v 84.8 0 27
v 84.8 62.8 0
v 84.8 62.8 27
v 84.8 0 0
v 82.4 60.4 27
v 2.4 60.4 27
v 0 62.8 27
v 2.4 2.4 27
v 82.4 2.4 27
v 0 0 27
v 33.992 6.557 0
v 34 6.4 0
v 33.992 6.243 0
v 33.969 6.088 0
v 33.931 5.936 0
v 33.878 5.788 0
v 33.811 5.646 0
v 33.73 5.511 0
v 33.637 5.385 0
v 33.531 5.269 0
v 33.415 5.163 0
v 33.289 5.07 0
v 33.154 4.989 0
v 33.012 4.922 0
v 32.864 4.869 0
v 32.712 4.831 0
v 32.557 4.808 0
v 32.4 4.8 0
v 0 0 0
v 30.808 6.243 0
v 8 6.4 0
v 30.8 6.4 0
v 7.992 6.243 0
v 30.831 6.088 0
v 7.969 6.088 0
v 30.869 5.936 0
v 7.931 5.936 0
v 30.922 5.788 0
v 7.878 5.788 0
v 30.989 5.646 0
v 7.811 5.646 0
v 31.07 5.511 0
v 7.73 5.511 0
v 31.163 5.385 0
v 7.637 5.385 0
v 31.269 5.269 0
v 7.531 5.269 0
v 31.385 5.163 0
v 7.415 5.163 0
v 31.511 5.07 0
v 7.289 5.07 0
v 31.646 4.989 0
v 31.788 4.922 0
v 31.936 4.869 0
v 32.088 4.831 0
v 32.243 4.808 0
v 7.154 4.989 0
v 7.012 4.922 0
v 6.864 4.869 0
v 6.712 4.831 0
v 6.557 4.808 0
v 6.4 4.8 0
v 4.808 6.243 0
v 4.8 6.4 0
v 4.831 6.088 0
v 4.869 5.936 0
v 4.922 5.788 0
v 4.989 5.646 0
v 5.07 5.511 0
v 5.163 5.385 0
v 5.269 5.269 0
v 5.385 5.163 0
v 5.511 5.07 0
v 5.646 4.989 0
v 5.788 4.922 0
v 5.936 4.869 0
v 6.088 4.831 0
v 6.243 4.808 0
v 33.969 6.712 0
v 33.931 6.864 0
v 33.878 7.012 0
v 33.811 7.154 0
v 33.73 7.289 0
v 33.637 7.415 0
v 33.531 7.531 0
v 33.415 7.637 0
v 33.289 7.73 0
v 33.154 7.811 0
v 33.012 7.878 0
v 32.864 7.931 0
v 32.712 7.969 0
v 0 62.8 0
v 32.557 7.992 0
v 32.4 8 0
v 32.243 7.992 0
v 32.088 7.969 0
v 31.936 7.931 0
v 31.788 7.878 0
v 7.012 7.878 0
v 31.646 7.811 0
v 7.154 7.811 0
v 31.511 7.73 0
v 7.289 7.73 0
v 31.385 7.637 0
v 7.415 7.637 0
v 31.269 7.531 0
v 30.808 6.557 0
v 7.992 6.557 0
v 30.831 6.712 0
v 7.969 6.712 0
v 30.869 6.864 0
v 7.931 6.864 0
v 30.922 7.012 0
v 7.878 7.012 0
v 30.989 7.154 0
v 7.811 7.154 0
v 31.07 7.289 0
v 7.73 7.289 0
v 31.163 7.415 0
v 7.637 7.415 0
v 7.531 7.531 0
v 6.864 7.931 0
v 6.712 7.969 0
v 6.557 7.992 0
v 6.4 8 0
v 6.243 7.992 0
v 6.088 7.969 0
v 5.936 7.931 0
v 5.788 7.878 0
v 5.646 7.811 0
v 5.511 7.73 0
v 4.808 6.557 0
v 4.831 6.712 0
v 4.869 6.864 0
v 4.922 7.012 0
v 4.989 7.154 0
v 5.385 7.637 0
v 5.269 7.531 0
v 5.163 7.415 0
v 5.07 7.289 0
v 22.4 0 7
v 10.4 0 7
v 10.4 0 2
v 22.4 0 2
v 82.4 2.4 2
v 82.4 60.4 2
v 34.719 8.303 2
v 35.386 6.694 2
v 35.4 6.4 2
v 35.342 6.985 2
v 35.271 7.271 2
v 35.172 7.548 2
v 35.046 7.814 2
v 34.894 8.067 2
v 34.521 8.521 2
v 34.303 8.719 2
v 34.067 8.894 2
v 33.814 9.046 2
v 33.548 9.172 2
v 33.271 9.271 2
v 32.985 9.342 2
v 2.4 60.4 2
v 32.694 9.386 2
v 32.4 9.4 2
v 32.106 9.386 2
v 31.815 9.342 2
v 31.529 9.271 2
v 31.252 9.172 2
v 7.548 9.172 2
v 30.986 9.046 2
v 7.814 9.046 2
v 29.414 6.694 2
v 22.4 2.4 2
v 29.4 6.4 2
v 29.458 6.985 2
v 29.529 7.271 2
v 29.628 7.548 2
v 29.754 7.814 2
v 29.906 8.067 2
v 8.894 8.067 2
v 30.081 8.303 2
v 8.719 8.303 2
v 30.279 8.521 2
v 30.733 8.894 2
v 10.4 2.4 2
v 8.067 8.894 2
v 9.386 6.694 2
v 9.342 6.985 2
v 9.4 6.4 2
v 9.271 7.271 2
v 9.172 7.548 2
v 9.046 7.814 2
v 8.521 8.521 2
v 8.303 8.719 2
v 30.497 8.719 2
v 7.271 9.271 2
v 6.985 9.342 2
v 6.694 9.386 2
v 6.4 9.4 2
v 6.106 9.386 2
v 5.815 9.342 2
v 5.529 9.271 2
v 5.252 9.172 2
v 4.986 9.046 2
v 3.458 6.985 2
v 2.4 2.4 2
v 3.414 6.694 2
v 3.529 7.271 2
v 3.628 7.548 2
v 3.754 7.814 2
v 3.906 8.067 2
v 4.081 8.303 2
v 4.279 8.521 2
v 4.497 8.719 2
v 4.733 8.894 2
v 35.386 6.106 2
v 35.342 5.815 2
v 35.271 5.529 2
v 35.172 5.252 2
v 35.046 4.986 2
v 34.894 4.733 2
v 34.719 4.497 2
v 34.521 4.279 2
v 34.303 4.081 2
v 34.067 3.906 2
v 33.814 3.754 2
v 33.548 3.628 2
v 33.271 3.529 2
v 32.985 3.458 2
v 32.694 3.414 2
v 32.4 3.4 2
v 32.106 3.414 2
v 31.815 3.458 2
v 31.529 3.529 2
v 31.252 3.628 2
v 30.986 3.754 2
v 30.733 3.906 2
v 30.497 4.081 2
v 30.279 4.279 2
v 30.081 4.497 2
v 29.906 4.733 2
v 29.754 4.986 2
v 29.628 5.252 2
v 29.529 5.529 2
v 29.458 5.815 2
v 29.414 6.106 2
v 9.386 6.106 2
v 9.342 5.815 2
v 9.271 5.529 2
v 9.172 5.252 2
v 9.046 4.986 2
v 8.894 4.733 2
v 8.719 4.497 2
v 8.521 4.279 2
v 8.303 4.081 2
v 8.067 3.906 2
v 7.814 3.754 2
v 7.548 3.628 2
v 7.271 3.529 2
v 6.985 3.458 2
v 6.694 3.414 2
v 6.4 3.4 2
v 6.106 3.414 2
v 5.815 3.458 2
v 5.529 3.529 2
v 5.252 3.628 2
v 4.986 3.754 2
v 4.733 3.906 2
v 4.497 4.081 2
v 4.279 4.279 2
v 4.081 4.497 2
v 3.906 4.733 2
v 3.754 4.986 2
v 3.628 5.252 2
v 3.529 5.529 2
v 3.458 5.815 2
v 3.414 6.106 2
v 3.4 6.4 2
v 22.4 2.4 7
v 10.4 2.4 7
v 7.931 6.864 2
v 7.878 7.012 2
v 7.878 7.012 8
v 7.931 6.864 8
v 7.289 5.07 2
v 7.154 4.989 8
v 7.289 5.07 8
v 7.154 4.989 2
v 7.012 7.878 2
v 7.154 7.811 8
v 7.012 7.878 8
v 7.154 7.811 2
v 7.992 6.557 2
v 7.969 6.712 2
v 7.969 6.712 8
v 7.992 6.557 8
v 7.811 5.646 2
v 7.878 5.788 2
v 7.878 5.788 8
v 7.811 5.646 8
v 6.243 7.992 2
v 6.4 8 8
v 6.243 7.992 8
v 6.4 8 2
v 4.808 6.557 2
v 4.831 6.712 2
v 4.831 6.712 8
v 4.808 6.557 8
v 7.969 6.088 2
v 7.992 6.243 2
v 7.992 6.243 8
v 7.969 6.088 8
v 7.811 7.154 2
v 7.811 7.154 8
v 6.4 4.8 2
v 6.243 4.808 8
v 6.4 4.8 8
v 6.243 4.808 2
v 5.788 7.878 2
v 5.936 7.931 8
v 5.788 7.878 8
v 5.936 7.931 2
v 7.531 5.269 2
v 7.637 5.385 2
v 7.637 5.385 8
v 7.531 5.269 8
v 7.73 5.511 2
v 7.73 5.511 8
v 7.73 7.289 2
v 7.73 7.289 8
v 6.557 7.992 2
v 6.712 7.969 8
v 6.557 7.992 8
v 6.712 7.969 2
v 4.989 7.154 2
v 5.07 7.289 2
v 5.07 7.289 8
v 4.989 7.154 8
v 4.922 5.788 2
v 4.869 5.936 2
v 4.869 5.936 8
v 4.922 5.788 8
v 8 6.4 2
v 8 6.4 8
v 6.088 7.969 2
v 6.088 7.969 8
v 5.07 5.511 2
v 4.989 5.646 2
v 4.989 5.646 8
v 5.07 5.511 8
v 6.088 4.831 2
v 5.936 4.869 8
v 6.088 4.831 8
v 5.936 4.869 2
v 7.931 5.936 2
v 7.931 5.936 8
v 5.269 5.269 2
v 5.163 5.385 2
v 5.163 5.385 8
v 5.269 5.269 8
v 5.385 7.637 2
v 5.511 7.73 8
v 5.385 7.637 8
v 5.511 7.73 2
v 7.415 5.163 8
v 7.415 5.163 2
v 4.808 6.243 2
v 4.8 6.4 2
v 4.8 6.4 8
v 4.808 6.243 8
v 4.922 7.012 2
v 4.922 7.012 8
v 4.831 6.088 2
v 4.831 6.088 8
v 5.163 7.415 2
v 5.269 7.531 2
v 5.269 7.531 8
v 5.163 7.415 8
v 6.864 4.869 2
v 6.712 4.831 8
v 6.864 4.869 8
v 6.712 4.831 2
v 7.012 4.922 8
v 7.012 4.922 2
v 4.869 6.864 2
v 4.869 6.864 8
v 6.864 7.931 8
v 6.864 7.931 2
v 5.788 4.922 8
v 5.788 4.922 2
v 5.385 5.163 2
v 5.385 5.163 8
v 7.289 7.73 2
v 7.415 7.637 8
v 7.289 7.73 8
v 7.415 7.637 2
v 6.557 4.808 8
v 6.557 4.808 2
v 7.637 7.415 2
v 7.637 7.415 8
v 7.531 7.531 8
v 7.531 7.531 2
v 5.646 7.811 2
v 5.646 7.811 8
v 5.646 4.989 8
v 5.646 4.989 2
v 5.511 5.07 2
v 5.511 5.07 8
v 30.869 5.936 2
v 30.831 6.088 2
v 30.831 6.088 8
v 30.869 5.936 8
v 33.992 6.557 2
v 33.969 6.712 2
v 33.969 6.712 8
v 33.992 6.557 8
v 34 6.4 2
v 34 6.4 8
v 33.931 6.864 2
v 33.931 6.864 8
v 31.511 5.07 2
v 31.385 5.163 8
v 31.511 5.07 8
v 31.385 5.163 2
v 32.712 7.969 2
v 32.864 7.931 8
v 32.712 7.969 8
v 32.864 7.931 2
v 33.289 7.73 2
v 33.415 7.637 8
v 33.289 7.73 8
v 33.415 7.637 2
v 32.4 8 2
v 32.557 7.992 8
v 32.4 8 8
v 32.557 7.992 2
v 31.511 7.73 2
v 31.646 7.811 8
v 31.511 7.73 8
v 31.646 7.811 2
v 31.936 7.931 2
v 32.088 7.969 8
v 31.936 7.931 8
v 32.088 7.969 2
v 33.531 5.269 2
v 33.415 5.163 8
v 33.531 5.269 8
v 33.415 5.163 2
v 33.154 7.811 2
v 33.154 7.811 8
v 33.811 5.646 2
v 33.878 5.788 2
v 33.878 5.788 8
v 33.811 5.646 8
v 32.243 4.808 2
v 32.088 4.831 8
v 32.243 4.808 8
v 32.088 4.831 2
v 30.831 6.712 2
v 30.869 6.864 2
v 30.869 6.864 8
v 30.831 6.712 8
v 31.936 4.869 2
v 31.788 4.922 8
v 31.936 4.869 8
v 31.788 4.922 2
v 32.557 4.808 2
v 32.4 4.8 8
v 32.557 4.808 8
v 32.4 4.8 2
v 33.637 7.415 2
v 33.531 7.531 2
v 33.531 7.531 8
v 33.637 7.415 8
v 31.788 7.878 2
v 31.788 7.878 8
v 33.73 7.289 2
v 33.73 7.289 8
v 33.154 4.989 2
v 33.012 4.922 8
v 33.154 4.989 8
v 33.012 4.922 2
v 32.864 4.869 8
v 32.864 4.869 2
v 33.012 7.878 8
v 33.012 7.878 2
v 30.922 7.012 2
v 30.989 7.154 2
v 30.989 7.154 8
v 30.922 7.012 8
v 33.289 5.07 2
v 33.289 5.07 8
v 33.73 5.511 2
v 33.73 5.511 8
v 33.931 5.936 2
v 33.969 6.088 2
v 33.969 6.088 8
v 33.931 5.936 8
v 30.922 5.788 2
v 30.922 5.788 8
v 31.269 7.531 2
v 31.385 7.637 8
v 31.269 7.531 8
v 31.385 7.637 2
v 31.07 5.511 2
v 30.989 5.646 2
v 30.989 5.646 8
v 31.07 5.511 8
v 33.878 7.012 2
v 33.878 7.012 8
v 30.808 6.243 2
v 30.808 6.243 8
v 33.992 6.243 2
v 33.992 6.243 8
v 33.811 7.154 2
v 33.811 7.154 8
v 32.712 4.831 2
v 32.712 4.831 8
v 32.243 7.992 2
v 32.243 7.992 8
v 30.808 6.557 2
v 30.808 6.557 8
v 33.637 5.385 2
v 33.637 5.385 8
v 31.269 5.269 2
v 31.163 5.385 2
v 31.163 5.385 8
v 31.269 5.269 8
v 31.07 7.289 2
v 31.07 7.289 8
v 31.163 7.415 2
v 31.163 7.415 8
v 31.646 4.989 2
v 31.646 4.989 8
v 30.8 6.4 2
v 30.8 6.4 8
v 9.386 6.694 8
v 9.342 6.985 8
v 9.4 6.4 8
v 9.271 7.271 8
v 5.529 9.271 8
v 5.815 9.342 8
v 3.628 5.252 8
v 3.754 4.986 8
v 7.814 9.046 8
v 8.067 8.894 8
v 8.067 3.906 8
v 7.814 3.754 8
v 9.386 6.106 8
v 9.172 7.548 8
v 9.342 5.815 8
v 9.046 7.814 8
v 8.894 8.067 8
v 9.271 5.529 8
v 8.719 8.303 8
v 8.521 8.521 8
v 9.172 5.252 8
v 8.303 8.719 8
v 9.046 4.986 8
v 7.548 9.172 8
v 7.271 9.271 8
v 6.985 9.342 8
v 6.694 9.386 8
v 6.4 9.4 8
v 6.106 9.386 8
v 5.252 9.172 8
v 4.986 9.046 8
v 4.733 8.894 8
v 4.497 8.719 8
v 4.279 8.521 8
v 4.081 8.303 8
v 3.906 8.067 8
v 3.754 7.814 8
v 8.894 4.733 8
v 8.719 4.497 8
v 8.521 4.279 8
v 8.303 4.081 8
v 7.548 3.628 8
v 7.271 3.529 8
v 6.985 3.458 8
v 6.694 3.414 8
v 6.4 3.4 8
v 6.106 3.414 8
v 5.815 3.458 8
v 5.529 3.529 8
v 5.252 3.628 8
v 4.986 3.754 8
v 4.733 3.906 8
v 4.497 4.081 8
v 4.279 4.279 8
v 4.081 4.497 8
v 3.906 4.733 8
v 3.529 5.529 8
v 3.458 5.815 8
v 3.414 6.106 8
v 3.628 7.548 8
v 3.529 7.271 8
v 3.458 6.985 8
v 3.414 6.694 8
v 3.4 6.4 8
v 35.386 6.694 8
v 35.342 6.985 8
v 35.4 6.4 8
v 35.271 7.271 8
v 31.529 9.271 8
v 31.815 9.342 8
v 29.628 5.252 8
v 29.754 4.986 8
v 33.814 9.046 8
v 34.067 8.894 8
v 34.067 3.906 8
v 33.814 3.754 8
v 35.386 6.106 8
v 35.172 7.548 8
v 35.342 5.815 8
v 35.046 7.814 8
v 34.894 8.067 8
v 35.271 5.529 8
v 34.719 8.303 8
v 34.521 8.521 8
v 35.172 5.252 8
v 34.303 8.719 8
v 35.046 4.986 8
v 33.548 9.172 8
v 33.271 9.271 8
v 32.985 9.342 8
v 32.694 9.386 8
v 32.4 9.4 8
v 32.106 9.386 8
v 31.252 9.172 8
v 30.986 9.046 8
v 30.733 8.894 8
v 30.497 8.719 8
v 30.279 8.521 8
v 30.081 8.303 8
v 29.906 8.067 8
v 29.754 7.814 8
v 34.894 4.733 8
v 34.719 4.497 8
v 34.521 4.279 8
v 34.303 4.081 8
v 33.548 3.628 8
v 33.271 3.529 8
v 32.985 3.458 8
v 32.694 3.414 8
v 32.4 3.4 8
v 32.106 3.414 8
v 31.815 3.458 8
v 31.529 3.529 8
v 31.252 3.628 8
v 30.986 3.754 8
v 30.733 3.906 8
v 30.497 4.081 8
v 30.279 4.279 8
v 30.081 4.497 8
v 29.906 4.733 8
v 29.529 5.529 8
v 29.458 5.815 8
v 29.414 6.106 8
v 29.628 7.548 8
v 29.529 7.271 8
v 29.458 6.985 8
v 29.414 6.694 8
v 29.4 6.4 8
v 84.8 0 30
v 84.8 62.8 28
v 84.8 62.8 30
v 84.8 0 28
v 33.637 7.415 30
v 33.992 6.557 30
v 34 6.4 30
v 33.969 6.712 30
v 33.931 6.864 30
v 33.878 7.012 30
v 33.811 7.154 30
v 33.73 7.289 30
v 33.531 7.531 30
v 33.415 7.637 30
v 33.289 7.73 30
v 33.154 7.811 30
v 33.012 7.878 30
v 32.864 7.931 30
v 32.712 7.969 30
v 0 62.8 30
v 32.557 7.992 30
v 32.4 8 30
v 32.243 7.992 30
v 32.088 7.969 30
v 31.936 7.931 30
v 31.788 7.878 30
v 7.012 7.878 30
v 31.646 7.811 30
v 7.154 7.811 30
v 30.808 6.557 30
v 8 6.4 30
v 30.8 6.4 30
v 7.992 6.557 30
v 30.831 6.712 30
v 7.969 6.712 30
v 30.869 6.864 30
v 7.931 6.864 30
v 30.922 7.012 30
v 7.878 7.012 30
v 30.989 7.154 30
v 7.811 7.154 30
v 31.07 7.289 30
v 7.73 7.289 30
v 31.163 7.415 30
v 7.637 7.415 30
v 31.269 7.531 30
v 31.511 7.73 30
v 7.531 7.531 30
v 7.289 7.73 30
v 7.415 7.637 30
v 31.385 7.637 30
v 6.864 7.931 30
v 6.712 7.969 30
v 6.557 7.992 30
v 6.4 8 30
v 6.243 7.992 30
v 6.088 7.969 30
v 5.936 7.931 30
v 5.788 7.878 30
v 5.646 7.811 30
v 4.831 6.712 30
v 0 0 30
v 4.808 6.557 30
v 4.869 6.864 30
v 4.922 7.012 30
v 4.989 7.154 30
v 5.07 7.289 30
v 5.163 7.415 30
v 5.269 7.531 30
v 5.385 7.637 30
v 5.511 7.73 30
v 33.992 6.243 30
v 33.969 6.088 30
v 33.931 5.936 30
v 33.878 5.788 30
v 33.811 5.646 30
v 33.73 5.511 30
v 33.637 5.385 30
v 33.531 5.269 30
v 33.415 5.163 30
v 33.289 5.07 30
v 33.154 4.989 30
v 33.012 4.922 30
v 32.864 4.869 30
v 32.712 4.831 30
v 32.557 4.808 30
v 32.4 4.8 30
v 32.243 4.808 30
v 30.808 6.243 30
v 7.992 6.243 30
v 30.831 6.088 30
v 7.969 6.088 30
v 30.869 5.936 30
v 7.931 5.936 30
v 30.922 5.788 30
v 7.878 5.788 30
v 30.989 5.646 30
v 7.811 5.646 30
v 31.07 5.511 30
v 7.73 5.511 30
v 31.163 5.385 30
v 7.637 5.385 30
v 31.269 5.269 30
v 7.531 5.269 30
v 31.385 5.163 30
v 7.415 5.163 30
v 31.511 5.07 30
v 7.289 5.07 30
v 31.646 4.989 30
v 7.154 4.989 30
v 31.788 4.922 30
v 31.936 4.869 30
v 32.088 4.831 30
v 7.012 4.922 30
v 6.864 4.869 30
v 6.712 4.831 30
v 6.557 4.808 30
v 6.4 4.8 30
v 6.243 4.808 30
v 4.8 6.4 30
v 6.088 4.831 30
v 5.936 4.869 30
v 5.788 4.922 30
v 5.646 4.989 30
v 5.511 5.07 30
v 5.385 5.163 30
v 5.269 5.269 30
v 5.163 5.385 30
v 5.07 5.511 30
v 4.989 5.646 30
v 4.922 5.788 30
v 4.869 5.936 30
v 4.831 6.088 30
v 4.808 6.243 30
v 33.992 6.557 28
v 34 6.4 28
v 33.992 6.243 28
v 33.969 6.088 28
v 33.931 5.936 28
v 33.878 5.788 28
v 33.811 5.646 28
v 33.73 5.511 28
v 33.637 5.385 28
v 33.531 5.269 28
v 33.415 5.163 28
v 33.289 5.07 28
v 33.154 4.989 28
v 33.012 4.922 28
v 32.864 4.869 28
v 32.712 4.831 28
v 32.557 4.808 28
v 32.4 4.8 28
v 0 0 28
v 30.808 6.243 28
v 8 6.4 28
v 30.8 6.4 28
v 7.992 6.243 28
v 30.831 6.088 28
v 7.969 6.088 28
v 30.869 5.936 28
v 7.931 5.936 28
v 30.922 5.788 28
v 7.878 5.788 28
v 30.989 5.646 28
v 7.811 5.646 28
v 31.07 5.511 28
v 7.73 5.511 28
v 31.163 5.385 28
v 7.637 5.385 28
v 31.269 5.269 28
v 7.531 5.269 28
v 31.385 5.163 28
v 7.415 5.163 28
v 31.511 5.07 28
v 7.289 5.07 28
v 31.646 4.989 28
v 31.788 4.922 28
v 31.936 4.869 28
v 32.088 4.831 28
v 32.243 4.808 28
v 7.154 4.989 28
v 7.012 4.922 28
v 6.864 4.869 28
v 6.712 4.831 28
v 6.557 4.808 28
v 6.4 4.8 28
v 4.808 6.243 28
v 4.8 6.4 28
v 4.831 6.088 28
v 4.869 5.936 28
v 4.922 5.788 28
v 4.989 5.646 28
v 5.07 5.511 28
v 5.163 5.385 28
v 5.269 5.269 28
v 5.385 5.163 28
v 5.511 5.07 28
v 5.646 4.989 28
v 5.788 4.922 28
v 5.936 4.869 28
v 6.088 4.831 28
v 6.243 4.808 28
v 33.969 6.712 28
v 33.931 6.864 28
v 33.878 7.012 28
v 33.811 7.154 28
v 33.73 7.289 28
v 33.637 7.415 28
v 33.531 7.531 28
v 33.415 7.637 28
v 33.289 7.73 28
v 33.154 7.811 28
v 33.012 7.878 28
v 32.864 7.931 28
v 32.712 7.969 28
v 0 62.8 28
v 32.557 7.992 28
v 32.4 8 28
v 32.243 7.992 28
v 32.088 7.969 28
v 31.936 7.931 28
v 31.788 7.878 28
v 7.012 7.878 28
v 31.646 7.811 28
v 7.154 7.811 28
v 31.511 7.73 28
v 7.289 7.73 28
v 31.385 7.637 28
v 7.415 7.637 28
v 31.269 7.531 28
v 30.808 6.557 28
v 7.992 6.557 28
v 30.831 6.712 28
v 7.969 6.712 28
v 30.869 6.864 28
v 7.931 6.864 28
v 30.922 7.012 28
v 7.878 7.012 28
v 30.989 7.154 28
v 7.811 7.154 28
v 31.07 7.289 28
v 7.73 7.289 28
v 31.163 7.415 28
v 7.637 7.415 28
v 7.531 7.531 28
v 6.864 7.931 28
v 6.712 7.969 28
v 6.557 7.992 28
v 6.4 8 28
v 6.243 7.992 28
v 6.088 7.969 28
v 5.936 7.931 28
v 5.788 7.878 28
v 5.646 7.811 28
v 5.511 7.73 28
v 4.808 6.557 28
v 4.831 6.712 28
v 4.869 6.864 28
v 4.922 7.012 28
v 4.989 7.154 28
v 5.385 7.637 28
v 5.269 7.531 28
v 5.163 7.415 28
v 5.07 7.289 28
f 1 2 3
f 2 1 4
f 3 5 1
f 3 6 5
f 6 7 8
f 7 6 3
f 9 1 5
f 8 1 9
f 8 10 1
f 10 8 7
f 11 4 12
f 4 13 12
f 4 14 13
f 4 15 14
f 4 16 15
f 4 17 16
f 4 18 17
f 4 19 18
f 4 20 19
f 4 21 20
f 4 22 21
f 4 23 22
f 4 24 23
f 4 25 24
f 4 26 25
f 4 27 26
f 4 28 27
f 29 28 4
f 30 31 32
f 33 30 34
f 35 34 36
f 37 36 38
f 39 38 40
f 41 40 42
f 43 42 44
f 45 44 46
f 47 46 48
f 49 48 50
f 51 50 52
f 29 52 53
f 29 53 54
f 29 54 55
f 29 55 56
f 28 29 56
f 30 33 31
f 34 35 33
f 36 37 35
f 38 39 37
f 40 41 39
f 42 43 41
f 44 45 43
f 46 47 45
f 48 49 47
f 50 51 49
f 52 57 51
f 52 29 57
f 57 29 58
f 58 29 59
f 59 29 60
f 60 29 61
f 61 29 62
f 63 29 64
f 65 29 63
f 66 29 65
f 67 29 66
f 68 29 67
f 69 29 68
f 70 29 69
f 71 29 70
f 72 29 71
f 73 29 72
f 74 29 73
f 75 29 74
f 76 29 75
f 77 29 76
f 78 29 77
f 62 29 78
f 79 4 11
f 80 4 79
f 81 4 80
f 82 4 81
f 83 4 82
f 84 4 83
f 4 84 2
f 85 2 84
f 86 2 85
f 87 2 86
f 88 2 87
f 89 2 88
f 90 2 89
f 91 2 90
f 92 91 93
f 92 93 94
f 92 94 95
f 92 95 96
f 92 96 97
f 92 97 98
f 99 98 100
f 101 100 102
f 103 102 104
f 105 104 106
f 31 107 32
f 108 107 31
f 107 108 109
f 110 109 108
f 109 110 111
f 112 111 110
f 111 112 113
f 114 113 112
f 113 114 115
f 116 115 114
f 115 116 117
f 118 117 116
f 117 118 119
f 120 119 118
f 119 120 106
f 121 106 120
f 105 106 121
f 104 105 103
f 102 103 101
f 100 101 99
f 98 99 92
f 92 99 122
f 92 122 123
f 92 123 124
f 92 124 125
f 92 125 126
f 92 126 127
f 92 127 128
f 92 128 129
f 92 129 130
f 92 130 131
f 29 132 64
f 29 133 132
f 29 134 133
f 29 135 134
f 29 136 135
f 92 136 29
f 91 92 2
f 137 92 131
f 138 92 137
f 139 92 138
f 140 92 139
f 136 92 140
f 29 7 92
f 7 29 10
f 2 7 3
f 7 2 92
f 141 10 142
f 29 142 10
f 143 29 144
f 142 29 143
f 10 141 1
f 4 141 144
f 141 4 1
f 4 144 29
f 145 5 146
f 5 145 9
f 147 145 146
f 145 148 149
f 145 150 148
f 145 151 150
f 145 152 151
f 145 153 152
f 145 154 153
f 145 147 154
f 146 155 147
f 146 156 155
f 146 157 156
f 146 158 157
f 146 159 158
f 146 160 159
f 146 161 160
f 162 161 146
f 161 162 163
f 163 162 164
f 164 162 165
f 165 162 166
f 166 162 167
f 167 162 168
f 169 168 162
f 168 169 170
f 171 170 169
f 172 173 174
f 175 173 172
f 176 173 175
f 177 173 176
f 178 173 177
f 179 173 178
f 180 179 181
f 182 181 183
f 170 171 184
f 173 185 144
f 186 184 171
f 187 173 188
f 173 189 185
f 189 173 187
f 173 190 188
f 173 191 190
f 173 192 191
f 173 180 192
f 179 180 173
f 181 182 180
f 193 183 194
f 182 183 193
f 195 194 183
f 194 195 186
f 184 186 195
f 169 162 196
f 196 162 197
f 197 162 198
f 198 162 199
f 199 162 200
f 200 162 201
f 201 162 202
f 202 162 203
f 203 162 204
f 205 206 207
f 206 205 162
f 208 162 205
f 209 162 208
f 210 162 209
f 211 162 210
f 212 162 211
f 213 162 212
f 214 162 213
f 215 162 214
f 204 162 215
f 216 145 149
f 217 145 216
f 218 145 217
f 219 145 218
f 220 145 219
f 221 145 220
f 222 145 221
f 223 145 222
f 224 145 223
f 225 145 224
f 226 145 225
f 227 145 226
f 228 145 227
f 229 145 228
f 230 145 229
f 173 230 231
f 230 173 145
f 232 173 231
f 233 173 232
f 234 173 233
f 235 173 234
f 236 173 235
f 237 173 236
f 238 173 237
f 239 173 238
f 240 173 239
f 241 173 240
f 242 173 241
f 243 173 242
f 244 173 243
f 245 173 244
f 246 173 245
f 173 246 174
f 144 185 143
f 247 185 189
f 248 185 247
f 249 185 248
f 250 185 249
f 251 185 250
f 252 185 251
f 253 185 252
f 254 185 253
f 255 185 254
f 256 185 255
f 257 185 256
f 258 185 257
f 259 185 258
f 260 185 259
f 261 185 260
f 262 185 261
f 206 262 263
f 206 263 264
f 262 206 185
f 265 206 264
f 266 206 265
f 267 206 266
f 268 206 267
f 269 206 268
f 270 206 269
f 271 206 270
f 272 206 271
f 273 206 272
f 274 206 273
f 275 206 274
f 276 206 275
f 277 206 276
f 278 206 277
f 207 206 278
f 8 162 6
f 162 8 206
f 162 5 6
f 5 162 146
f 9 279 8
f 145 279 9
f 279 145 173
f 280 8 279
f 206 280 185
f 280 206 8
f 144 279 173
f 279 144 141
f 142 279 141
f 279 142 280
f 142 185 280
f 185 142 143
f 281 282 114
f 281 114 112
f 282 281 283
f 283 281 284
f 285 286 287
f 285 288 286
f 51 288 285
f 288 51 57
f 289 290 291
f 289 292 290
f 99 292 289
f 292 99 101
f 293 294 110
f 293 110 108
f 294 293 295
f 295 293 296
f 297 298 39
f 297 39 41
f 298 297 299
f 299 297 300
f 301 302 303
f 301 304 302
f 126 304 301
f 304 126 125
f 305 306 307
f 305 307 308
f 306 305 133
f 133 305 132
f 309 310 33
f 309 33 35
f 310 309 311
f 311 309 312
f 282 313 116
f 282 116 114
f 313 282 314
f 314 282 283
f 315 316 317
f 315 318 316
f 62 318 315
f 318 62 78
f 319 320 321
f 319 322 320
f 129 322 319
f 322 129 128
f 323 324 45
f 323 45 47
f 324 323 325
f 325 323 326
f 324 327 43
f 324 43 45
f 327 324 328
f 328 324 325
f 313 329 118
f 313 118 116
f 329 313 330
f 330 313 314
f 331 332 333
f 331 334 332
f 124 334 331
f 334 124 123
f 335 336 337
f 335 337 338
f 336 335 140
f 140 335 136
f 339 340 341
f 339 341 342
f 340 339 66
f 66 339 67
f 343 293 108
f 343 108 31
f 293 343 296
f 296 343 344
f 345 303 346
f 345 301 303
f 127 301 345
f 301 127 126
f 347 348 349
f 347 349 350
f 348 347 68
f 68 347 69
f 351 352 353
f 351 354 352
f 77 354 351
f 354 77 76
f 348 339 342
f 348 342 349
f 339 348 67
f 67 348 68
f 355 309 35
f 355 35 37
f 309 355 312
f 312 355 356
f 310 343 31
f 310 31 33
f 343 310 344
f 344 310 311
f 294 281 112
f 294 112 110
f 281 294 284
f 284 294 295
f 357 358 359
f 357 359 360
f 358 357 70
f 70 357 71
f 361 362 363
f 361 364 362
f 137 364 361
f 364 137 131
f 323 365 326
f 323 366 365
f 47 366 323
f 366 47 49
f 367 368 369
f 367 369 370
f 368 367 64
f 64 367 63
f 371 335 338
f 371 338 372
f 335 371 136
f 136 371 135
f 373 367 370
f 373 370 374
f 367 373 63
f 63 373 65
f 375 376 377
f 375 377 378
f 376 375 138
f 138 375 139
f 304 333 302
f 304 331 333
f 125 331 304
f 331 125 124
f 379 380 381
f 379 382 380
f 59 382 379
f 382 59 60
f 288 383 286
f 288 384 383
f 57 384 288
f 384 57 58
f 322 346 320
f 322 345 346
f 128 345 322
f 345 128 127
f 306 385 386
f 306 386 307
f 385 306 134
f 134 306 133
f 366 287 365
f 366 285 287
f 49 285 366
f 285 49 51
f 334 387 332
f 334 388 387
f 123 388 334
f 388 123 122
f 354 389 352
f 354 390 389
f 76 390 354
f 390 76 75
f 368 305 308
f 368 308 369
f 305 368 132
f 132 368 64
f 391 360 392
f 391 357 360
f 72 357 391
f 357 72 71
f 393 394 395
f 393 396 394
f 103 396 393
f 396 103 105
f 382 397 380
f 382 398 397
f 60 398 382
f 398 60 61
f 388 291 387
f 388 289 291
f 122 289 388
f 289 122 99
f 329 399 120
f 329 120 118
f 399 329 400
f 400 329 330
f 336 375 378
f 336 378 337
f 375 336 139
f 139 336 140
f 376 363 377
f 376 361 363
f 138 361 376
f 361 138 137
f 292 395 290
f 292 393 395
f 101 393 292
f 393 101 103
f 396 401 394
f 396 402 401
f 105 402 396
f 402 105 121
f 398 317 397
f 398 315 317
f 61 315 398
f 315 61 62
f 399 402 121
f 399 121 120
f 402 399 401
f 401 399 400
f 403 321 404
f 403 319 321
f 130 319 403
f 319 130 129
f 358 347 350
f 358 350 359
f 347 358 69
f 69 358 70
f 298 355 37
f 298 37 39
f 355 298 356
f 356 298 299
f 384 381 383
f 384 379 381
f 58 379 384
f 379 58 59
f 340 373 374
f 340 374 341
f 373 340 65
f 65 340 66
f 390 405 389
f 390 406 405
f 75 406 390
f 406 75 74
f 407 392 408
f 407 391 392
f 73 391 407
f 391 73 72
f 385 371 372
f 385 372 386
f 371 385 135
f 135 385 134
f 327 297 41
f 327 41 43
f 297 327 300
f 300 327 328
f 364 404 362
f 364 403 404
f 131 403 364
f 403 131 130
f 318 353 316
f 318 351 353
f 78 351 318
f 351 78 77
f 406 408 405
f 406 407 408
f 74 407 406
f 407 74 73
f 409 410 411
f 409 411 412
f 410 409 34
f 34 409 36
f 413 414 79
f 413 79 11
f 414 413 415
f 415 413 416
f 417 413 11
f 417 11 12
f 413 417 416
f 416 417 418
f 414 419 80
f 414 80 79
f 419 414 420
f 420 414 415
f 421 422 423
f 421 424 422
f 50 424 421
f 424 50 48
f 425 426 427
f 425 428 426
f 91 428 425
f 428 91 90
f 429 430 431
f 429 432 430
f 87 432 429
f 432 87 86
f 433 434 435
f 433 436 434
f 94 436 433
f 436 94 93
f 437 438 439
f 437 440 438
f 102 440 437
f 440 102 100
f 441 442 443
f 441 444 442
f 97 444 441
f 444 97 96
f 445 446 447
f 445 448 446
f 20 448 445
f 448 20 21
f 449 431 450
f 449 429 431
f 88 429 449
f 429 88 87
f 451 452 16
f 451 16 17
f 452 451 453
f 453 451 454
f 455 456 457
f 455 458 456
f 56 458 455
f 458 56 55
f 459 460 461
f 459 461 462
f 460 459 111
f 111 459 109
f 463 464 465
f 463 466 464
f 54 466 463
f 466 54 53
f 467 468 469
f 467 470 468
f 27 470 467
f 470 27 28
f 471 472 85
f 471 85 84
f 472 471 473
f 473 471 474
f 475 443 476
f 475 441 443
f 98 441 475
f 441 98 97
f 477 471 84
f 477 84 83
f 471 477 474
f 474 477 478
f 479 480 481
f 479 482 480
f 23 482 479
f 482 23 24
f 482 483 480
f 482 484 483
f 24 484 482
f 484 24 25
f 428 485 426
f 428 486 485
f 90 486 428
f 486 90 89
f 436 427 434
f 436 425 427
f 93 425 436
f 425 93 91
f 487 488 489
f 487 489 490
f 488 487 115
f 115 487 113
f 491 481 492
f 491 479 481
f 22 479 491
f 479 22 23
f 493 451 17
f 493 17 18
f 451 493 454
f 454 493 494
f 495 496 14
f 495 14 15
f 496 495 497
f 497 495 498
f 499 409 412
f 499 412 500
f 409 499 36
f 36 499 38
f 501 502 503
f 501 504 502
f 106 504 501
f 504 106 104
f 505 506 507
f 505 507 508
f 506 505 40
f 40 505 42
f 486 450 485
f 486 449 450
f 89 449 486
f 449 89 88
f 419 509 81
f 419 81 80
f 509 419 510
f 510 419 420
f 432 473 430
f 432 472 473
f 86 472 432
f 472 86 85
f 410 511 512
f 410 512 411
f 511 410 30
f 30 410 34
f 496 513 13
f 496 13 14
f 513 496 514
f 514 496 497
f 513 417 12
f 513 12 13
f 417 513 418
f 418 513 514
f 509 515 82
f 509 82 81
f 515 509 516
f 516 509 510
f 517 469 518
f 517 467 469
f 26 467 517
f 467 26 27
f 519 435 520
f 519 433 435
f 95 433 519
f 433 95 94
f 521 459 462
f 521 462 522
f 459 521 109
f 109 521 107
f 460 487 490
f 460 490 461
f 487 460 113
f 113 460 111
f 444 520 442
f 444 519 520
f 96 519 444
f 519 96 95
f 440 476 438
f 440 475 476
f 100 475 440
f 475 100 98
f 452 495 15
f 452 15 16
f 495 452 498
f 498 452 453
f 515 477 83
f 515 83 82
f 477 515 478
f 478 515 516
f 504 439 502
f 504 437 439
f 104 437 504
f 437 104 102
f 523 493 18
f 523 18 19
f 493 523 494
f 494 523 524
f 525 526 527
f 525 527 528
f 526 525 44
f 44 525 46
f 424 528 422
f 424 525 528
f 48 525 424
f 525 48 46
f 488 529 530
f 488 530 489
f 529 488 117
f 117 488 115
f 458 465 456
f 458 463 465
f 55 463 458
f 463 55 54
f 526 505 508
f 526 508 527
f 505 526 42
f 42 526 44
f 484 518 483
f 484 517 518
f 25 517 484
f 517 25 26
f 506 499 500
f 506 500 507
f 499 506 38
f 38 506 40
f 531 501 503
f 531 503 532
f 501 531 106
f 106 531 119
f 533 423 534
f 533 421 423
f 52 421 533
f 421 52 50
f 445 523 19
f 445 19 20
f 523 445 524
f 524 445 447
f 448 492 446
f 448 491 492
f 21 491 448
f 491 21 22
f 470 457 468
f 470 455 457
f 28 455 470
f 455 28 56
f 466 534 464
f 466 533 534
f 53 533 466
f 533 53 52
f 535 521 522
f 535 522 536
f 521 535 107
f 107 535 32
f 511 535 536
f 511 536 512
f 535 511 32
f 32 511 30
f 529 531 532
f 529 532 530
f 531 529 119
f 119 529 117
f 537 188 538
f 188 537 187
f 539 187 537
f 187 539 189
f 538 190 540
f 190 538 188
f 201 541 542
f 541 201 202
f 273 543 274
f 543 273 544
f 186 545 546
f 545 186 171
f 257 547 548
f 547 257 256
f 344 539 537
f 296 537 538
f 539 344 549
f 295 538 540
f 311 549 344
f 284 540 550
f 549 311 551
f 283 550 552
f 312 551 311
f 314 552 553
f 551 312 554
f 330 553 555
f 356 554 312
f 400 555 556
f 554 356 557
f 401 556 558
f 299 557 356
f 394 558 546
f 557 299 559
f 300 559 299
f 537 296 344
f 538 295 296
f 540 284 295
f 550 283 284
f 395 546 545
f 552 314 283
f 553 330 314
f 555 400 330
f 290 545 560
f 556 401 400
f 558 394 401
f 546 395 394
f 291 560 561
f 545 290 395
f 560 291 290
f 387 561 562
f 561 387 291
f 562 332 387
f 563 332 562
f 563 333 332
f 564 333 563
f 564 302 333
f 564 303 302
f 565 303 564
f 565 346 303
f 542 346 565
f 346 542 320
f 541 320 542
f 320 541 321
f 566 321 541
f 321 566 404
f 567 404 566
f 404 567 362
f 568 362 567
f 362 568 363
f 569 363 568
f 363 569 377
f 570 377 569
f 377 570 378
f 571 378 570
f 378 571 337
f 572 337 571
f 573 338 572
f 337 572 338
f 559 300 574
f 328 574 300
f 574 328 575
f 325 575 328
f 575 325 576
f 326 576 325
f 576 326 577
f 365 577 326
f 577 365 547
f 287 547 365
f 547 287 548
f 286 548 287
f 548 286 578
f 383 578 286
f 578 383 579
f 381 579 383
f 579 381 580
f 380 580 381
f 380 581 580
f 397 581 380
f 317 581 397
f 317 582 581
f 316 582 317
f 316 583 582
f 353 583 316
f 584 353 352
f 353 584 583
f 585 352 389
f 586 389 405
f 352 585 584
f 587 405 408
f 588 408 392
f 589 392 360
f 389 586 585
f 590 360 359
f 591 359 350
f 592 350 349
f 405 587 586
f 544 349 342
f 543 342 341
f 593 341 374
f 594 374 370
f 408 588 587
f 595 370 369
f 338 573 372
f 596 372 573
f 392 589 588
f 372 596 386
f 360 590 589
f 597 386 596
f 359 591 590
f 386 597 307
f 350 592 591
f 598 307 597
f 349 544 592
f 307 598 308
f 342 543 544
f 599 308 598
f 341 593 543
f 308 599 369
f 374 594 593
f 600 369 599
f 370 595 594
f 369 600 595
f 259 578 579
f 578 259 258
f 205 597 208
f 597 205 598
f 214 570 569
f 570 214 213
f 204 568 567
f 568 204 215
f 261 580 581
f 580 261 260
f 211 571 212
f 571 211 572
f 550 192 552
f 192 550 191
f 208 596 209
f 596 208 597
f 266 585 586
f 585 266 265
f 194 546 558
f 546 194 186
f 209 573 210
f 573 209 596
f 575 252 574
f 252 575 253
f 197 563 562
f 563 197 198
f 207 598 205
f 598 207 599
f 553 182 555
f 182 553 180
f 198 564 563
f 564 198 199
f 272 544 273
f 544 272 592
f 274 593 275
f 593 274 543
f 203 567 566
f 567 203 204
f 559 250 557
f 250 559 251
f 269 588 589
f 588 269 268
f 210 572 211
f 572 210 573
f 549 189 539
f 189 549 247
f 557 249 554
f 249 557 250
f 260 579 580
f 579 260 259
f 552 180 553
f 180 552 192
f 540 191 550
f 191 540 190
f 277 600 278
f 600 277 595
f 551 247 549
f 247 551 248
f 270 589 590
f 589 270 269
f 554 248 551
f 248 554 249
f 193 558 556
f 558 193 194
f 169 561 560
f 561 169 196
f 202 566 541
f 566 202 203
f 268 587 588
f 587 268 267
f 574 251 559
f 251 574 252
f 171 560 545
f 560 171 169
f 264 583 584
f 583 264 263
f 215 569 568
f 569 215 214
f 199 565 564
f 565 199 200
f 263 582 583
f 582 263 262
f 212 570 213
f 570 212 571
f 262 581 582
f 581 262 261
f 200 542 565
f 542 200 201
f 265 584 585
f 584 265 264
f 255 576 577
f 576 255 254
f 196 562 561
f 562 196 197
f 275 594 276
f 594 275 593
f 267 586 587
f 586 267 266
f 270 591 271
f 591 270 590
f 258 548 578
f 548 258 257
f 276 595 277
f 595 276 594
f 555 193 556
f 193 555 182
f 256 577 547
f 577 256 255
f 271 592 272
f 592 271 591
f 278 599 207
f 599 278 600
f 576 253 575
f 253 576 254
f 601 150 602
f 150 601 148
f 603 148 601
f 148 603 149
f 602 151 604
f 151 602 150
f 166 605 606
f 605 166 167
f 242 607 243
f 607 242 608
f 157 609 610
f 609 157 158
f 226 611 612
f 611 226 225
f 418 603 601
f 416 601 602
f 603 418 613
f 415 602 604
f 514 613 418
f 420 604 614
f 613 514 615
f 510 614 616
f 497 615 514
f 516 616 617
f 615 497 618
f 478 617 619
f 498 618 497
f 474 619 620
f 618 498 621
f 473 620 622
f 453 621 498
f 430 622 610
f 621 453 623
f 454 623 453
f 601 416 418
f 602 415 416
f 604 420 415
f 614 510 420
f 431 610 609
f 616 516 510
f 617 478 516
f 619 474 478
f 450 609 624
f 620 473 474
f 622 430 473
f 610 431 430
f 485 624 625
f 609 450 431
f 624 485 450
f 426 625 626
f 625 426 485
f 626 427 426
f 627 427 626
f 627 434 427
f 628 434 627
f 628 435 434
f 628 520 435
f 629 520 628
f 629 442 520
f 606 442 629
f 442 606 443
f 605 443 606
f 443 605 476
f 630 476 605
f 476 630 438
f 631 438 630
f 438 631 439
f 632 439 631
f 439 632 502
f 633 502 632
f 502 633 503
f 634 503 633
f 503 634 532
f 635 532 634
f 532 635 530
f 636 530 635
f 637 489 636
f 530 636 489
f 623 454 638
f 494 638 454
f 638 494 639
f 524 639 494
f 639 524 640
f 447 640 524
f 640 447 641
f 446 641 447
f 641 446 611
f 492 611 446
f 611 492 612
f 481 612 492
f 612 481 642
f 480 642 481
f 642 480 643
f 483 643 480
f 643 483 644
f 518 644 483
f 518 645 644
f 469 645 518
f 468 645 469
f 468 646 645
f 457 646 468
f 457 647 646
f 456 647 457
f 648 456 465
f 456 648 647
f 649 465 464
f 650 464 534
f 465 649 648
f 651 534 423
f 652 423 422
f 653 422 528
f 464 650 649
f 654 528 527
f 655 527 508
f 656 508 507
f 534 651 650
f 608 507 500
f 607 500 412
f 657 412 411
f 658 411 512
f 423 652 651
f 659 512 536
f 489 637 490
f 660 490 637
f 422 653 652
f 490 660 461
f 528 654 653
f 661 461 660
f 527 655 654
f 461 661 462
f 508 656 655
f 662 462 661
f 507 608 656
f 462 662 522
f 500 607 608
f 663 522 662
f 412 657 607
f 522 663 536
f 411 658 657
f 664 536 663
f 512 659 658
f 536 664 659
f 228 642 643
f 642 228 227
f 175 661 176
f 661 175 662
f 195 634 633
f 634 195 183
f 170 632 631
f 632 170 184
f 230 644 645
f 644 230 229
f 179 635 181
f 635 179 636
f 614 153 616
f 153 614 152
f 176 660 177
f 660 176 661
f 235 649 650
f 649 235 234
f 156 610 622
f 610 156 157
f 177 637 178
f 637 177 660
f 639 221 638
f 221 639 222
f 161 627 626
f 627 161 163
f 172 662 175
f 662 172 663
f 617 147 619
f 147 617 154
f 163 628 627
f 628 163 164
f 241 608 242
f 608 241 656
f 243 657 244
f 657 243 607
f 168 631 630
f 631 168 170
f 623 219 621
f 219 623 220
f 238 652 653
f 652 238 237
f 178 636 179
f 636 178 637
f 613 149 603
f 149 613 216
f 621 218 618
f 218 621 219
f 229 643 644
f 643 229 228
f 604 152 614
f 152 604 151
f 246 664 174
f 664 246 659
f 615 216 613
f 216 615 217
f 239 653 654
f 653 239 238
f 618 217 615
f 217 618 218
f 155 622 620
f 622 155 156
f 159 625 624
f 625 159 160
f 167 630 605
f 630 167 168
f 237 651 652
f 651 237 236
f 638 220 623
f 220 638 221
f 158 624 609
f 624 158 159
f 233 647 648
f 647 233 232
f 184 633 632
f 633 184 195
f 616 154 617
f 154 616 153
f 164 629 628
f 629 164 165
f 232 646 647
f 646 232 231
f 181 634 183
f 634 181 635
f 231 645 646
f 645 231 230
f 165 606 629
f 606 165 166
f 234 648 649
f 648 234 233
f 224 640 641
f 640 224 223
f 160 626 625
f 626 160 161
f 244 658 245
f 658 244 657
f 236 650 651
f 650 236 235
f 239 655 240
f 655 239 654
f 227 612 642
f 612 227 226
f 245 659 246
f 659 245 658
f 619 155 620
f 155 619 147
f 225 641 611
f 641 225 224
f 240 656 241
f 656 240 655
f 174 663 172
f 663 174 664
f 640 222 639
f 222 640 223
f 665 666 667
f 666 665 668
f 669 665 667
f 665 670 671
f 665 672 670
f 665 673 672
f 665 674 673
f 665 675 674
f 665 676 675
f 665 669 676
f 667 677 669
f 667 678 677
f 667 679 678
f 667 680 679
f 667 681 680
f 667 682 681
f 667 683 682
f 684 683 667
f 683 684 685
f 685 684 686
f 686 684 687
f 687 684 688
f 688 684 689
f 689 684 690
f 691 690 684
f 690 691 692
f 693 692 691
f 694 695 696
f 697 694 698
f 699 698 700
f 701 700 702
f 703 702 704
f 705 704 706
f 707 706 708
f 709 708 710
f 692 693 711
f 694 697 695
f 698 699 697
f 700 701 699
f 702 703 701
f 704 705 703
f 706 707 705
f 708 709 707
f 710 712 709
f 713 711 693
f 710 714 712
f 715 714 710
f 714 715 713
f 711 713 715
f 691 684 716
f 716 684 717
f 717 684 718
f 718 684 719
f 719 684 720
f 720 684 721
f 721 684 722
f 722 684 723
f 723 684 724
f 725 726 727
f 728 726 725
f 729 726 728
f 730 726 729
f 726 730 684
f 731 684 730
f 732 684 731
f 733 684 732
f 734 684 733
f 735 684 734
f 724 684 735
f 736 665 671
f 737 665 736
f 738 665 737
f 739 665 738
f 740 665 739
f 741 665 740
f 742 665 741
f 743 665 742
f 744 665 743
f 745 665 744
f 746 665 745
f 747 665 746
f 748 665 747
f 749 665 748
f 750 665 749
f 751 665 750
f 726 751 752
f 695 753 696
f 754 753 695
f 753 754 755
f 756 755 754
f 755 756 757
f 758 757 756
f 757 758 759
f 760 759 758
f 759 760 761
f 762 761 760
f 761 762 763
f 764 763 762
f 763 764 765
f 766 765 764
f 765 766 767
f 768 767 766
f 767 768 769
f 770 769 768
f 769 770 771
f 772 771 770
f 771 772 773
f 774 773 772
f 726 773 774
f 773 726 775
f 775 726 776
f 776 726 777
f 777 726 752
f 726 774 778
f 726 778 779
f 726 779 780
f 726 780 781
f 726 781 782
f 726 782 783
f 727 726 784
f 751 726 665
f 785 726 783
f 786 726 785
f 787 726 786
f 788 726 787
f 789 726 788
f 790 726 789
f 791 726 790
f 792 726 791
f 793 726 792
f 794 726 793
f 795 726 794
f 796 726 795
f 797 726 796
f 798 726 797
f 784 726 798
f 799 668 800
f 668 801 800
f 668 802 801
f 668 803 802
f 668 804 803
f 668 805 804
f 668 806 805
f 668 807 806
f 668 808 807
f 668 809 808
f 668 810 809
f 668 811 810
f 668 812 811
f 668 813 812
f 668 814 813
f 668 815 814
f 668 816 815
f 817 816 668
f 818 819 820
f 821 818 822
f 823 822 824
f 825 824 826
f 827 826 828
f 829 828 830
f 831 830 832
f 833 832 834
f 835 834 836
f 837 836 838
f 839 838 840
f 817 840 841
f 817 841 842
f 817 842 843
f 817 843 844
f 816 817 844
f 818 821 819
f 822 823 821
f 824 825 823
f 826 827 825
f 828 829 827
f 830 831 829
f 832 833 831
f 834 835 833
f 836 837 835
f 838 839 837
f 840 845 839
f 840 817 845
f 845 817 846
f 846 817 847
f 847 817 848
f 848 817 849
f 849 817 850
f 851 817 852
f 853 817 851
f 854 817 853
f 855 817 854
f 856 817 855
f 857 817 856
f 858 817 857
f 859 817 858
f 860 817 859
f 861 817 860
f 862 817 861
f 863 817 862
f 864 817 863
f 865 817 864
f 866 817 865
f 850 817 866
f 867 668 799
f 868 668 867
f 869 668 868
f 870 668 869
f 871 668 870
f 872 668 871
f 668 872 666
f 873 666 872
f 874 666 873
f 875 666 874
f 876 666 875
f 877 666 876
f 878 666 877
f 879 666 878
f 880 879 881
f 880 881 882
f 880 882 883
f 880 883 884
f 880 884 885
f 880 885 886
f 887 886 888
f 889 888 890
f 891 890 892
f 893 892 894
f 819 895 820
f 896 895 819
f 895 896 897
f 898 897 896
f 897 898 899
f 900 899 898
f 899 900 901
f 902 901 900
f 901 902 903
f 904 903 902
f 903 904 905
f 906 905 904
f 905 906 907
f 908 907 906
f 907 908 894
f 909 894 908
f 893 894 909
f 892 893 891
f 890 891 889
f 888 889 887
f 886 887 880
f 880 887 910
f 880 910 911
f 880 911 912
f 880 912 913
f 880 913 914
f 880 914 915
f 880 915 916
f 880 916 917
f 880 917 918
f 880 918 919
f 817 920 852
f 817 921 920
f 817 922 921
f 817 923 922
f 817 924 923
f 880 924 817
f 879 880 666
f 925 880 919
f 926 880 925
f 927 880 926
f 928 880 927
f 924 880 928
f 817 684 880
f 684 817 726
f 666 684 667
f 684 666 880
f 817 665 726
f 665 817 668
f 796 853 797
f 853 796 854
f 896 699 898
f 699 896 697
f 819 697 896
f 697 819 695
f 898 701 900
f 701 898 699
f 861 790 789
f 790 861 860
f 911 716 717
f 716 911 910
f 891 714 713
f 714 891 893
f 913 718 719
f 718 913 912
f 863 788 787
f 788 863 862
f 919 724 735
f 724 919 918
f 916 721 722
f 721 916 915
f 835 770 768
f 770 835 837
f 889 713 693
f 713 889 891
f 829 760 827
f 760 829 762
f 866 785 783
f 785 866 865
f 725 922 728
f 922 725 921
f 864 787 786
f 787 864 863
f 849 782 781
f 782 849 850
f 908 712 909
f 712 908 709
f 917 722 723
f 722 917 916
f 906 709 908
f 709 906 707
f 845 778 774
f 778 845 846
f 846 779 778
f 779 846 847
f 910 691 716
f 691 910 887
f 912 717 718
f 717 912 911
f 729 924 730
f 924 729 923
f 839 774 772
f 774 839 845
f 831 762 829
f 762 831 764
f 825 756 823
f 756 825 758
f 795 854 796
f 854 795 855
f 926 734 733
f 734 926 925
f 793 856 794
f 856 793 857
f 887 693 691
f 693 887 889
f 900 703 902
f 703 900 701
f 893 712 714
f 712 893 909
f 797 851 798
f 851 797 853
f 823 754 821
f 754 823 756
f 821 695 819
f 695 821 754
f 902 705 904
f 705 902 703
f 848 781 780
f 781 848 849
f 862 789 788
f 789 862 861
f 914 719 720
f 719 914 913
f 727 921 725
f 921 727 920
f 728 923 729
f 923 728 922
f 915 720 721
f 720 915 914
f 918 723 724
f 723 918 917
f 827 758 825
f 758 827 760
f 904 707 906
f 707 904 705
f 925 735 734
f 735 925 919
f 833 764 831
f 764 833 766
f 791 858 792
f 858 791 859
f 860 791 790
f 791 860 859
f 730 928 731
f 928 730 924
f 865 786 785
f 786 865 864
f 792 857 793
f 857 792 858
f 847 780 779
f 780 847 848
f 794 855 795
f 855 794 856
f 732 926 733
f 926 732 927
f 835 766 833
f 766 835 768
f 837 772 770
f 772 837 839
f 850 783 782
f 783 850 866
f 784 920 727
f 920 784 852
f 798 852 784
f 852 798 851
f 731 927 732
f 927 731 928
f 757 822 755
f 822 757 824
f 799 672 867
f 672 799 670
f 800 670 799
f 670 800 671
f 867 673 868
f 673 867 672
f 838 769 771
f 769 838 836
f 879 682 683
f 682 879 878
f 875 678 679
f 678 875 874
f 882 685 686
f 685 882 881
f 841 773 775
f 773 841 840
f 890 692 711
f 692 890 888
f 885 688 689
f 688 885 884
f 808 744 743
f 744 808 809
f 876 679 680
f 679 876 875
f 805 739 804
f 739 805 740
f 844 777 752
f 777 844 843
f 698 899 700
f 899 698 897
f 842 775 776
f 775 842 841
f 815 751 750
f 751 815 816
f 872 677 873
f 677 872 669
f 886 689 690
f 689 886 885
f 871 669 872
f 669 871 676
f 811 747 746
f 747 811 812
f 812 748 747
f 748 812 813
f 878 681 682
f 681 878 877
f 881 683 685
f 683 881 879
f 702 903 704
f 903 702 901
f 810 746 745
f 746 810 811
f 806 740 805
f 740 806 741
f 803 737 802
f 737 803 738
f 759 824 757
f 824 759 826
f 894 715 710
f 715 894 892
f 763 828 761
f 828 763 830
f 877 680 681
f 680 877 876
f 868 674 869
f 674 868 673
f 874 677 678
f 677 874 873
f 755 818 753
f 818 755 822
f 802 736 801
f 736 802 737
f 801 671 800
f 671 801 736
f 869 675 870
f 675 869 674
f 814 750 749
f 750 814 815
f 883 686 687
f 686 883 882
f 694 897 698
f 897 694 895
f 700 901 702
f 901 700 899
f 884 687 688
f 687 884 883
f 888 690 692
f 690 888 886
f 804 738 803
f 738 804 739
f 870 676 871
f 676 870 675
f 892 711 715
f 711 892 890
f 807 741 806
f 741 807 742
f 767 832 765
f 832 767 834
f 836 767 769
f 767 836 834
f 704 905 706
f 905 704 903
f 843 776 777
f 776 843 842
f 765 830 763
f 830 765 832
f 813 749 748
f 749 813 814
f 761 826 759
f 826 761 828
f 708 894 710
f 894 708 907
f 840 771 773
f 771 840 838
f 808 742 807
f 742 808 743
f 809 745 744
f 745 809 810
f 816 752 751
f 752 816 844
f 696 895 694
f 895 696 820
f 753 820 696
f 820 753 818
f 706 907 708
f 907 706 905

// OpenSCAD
// Auto-generated by Mecha-Splicer
// enclosure=ctrl_box_5_enclosure

$fn = 64;

inner_w = 80.0;
inner_d = 58.0;
inner_h = 25.0;
wall = 2.4;
floor = 2.0;
lid_t = 2.0;
standoff_h = 6.0;
standoff_od = 6.0;
standoff_hole_d = 3.2;

module base() {
  union() {
    difference() {
      cube([84.8, 62.8, 27.0], center=false);
      translate([2.4, 2.4, 2.0]) cube([80.0, 58.0, 25.0], center=false);
    translate([10.4, 0, 2.0]) cube([12.0, 3.4, 5.0], center=false);
      translate([6.4, 6.4, -1]) cylinder(h=29.0, d=3.2, center=false);
      translate([32.4, 6.4, -1]) cylinder(h=29.0, d=3.2, center=false);
    }
    // Standoffs
    difference() {
      union() {
        translate([6.4, 6.4, 2.0]) cylinder(h=standoff_h, d=standoff_od, center=false);
        translate([32.4, 6.4, 2.0]) cylinder(h=standoff_h, d=standoff_od, center=false);
      }
      translate([6.4, 6.4, 1.0]) cylinder(h=standoff_h + 2, d=standoff_hole_d, center=false);
      translate([32.4, 6.4, 1.0]) cylinder(h=standoff_h + 2, d=standoff_hole_d, center=false);
    }
  }
}

module lid() {
  difference() {
    cube([84.8, 62.8, 2.0], center=false);
    translate([6.4, 6.4, -1]) cylinder(h=4.0, d=3.2, center=false);
    translate([32.4, 6.4, -1]) cylinder(h=4.0, d=3.2, center=false);
  }
}

module enclosure() {
  base();
  translate([0, 0, 28.0]) lid();
}
enclosure();
